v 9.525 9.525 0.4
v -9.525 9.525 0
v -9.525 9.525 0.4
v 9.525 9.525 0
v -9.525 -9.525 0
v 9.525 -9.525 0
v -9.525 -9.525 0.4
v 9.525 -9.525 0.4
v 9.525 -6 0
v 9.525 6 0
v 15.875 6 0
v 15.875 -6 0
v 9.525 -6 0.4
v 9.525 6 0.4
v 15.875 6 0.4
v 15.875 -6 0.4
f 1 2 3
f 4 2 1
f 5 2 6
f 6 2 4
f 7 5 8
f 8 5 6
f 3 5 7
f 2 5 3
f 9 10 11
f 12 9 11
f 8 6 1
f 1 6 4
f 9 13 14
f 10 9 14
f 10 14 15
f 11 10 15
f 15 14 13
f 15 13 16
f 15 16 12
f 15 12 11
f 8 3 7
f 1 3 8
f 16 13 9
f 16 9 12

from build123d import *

# Parameters (mm, degrees)
SKETCH1_W           = 19.05
SKETCH1_H           = 19.05
BOSS_EXTRUDE1_DEPTH = 0.4
SKETCH2_W           = 6.35
SKETCH2_H           = 12
BOSS_EXTRUDE2_DEPTH = 0.4


with BuildPart() as part:
    # Sketch1 → Boss-Extrude1 (new body)
    with BuildSketch(Plane.XY):
        Rectangle(SKETCH1_W, SKETCH1_H)
    extrude(amount=BOSS_EXTRUDE1_DEPTH)


with BuildPart() as body_2:
    # Sketch2 → Boss-Extrude2 (new body)
    with BuildSketch(Plane.XY.offset(0.4)):
        with Locations((12.7, 0)):
            Rectangle(SKETCH2_W, SKETCH2_H)
    extrude(amount=-BOSS_EXTRUDE2_DEPTH)


solid = Compound([part.part, body_2.part])
